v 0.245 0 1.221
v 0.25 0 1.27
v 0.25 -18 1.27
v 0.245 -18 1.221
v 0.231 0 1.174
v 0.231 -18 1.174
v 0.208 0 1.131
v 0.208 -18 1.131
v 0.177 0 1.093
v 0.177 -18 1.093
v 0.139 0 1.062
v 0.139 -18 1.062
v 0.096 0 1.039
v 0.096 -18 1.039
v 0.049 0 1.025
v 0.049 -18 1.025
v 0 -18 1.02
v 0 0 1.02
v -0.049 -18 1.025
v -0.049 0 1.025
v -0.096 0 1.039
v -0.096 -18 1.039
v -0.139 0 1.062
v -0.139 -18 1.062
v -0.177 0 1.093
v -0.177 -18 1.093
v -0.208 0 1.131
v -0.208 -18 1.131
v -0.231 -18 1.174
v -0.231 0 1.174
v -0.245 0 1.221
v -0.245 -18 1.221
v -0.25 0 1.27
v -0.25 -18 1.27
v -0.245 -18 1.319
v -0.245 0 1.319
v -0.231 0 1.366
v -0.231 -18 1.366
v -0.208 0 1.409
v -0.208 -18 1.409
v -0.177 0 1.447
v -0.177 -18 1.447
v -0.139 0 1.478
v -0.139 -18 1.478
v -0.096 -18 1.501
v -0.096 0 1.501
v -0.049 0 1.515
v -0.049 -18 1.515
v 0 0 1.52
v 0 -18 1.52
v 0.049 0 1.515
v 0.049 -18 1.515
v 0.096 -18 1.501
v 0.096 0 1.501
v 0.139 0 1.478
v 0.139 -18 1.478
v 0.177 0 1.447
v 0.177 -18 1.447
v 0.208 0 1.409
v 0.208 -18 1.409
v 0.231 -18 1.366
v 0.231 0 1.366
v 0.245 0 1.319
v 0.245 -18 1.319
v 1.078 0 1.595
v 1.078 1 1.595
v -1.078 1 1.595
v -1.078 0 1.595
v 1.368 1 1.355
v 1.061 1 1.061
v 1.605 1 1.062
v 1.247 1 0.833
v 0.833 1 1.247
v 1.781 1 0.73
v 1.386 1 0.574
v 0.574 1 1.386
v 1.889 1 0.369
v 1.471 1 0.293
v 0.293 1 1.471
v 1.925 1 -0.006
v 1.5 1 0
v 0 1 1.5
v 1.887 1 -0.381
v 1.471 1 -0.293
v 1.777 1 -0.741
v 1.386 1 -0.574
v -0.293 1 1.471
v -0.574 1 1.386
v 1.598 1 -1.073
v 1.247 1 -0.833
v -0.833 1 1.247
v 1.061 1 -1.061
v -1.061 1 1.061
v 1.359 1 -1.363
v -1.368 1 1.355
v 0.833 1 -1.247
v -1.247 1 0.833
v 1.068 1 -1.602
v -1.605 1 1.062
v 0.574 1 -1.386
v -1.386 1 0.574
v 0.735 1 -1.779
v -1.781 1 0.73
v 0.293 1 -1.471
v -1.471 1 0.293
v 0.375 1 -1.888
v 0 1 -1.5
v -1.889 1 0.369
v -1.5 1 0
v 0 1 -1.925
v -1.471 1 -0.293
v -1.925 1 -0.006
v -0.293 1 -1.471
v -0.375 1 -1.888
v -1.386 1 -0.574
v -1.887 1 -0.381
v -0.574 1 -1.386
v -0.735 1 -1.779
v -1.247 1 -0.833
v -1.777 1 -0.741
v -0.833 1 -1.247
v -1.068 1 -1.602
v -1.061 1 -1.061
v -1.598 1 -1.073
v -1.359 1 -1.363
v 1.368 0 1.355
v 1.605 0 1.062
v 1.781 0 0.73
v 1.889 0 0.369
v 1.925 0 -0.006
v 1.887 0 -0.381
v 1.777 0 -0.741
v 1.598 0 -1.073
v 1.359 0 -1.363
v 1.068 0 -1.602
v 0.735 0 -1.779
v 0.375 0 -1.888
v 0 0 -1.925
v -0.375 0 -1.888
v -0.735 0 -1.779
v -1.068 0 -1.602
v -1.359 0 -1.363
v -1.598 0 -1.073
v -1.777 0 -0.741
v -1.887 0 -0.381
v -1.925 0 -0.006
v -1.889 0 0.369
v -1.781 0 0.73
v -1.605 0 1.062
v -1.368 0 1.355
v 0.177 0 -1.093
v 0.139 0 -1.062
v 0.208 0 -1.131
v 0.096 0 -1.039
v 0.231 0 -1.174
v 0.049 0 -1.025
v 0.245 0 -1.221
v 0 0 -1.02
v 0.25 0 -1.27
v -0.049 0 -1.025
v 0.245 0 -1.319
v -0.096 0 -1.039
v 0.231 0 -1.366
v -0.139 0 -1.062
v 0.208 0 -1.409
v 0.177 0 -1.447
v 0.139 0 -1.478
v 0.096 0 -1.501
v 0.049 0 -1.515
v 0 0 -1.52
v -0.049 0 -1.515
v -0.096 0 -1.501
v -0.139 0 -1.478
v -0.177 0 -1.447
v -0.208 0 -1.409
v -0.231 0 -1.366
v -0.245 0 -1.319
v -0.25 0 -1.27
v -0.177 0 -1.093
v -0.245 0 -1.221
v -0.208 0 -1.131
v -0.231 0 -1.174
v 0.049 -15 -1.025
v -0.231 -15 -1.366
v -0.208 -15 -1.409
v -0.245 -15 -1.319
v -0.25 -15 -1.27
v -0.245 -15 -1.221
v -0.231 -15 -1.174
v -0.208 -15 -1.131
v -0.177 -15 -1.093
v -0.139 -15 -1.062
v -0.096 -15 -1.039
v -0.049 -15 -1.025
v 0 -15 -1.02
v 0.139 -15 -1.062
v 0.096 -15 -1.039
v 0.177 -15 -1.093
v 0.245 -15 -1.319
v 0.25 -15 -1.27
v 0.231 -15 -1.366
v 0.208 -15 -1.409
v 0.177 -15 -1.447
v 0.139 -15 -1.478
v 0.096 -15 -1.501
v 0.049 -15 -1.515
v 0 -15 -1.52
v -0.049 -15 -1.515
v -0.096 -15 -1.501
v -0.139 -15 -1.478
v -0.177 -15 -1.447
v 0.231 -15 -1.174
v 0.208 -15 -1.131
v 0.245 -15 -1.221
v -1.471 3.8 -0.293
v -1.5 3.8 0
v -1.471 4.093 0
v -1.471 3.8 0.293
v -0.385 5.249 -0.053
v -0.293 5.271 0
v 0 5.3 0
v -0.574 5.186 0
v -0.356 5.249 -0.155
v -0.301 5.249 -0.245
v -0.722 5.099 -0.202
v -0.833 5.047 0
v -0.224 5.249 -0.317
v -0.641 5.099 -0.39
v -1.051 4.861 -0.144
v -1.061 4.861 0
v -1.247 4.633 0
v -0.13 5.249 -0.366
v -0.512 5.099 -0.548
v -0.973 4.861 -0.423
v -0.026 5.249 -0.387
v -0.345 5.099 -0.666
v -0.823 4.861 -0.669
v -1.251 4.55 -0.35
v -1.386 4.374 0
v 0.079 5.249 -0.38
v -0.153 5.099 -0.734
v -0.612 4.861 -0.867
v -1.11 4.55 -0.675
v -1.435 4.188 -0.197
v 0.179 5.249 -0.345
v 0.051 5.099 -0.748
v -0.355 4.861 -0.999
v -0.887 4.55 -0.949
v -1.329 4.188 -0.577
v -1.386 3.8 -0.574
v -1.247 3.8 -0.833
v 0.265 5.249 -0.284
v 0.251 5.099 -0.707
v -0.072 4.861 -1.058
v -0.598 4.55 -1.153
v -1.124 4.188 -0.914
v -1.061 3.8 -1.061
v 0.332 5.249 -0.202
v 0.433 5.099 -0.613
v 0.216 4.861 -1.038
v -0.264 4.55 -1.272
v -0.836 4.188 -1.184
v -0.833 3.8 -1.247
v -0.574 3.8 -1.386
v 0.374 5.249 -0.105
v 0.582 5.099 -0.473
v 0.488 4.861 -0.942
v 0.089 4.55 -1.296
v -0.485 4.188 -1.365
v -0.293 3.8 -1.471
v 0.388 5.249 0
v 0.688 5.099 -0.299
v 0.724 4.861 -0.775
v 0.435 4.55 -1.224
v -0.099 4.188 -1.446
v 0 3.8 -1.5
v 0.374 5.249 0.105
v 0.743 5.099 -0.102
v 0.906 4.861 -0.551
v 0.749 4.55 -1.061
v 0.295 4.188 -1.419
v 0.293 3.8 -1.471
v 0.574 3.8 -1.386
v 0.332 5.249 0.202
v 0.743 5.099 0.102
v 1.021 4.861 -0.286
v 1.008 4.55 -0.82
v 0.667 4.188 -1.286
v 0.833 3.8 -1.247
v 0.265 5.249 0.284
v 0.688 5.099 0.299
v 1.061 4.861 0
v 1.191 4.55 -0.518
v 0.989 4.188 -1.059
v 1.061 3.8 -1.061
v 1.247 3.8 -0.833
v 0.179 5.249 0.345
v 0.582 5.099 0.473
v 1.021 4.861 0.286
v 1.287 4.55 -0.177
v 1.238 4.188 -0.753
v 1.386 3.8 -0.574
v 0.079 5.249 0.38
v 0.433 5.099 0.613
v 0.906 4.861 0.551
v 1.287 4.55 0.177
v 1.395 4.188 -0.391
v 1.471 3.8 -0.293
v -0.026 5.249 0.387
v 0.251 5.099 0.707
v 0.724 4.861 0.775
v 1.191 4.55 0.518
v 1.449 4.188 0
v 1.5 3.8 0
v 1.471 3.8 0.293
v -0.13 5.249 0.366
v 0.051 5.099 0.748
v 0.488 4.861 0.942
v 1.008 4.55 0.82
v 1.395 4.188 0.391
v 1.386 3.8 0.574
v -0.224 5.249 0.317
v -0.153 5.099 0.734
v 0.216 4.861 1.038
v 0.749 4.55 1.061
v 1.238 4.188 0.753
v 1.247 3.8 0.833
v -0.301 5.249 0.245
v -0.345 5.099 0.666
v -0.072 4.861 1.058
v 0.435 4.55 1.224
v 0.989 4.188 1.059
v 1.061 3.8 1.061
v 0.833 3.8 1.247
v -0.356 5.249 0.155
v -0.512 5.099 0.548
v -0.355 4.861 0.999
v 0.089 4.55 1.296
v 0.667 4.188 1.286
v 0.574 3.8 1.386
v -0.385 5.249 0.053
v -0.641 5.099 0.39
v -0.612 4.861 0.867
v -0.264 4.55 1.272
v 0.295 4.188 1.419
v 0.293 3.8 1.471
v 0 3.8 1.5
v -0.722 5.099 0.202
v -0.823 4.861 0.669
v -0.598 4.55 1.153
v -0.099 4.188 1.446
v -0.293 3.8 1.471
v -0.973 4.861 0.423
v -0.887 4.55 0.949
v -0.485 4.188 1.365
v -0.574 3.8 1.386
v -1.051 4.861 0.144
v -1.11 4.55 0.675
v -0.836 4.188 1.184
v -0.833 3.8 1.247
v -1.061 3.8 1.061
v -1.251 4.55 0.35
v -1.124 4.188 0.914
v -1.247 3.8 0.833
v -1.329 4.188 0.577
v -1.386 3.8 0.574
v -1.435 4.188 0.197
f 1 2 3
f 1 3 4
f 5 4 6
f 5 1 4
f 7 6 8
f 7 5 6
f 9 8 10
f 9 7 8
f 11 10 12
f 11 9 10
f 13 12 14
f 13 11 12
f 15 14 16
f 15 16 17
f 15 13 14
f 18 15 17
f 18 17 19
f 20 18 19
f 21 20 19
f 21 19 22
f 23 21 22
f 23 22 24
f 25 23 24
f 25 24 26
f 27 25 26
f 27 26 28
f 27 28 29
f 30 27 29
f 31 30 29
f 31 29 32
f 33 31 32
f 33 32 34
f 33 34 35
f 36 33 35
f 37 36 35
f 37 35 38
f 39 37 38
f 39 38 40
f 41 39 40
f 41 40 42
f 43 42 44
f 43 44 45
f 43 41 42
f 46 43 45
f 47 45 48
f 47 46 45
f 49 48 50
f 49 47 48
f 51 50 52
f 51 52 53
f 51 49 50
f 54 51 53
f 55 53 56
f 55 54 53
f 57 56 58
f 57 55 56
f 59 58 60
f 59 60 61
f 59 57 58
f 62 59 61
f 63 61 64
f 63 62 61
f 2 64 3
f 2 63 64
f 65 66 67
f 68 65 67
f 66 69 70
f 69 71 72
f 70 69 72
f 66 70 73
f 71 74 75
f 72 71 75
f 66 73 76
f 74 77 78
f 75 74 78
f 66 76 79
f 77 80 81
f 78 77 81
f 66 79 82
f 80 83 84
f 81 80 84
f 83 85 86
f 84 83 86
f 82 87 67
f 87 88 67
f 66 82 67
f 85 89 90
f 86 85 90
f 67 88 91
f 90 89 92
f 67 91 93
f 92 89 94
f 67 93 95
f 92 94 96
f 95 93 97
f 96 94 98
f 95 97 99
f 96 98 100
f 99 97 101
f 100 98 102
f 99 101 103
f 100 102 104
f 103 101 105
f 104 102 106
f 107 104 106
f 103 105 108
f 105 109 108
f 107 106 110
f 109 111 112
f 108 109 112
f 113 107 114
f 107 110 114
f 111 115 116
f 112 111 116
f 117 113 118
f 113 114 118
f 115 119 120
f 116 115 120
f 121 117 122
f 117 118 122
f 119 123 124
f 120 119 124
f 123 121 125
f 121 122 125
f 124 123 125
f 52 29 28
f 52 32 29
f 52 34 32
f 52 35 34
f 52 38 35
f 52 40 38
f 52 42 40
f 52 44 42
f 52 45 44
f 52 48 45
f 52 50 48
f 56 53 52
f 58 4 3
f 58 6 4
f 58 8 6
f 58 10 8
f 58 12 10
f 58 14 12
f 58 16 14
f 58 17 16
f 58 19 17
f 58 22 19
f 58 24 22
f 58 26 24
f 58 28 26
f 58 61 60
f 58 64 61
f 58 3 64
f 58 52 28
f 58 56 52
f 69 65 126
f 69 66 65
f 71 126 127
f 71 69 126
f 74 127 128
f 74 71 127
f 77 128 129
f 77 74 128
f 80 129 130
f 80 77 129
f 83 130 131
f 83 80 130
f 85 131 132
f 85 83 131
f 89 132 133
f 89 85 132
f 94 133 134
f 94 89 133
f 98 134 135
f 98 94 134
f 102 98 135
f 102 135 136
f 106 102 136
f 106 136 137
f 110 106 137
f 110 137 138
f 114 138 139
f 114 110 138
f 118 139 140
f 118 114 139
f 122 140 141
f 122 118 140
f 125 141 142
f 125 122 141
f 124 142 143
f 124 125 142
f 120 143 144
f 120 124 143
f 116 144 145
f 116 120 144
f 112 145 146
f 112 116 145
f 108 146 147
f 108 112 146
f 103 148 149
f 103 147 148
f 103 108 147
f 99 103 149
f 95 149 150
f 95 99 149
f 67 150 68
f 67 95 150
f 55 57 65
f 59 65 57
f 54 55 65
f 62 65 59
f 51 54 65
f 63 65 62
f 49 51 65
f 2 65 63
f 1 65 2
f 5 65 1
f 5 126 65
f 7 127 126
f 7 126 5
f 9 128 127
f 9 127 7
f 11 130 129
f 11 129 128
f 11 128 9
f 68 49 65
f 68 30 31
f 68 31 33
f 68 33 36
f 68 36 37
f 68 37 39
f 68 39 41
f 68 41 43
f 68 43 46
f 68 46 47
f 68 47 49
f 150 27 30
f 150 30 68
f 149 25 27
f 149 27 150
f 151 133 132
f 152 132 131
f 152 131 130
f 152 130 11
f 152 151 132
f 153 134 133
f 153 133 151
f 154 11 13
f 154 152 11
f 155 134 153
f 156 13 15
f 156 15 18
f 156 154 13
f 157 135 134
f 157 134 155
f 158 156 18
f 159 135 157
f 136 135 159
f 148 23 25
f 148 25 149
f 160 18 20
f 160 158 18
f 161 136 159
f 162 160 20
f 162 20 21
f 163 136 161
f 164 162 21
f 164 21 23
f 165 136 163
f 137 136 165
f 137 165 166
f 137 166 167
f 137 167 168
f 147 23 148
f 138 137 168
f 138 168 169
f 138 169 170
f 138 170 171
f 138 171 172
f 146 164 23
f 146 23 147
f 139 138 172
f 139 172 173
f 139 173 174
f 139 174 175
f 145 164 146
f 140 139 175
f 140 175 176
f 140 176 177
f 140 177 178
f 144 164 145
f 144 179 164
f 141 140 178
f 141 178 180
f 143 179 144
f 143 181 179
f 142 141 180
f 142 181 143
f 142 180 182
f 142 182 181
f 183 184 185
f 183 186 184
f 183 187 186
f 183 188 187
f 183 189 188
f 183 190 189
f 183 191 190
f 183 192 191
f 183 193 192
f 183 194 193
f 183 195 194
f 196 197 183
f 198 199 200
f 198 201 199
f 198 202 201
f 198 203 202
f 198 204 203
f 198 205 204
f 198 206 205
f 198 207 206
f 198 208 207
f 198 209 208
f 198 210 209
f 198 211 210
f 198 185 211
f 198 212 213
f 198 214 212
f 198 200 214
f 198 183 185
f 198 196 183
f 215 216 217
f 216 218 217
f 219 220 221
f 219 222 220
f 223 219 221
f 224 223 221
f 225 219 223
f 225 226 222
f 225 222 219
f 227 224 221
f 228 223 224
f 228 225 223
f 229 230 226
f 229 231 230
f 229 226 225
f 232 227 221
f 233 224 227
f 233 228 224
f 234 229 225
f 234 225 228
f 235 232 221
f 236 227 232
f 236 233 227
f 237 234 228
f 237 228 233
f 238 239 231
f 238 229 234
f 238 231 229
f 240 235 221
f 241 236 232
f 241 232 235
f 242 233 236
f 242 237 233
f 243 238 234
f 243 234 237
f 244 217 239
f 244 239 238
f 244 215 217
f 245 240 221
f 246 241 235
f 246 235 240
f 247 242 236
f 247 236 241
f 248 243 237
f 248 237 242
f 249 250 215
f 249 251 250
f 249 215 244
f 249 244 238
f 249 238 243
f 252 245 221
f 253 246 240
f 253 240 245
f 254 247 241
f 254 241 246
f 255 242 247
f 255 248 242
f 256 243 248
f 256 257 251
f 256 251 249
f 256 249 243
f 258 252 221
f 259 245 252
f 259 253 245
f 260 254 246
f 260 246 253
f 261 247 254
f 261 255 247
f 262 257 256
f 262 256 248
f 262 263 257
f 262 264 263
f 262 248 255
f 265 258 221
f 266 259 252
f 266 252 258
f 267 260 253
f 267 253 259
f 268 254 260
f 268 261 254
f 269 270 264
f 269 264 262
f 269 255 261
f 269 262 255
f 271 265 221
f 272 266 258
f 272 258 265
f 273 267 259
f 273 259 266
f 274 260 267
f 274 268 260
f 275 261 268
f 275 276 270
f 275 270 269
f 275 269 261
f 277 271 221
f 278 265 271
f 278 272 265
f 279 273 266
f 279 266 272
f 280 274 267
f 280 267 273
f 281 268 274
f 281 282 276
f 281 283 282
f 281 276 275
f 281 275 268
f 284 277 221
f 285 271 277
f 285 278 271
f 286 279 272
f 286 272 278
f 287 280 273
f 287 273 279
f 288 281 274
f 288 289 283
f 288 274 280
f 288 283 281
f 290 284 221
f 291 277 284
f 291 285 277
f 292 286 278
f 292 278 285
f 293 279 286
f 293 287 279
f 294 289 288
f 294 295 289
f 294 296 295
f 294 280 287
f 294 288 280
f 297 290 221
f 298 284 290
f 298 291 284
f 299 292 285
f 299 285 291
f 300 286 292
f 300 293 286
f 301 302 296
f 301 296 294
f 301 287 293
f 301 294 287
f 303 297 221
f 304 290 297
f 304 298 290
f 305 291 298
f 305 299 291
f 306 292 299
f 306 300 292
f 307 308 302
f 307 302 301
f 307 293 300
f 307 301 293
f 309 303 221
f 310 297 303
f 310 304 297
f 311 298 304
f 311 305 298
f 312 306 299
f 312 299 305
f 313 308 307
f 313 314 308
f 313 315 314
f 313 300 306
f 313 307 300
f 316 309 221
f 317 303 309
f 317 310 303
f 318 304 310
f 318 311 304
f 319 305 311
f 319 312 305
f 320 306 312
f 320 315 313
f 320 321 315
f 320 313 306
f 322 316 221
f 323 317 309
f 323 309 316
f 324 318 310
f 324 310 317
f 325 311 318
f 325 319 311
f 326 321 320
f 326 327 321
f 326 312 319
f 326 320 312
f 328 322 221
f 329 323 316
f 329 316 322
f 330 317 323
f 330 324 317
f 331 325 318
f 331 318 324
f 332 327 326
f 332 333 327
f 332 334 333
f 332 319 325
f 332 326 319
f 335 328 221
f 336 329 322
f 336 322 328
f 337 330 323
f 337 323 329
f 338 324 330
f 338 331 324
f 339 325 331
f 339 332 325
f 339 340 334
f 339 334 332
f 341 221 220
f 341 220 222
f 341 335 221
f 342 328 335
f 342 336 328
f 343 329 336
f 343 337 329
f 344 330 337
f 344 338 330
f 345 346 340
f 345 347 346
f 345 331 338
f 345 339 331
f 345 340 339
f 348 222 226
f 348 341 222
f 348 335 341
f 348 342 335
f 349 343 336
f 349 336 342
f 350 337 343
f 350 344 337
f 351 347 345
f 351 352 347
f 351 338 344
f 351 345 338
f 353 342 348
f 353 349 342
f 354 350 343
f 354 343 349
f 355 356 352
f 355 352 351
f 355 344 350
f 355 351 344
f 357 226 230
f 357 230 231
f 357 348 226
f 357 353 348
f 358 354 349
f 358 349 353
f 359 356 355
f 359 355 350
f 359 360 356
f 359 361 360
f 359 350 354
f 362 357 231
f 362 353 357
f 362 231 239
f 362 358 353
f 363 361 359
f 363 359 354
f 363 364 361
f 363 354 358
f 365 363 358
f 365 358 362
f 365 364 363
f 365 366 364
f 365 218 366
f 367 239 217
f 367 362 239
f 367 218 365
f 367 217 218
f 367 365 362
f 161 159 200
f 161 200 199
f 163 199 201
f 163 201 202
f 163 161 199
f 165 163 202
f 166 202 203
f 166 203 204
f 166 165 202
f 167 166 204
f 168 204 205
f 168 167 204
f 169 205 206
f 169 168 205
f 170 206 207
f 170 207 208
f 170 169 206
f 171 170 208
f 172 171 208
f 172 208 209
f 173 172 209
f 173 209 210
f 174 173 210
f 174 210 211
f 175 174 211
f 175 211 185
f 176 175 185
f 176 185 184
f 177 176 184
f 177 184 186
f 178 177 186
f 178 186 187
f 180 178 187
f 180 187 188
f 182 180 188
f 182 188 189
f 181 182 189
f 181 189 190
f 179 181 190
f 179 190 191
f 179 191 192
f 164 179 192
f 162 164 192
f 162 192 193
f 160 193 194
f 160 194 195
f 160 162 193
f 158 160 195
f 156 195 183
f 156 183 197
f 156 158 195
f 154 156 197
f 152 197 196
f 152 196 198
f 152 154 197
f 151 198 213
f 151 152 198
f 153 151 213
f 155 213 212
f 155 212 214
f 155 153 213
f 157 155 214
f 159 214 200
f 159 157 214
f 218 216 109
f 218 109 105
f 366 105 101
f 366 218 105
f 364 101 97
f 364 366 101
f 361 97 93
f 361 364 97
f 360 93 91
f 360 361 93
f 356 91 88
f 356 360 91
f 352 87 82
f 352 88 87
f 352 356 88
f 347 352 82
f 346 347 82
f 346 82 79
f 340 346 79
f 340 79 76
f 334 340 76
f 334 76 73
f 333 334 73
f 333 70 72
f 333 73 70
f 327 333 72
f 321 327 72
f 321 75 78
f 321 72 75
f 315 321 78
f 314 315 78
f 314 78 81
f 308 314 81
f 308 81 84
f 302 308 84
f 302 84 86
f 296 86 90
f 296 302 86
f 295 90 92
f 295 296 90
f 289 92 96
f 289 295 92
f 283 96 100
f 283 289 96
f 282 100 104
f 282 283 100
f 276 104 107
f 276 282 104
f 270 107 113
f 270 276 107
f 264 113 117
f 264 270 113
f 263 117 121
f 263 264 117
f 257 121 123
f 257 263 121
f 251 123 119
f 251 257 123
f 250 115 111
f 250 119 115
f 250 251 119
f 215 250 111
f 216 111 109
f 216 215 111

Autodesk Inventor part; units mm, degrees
ref_plane "YZ Plane" through (0, 0, 0) normal (1, 0, 0) x (0, 1, 0)
ref_plane "XZ Plane" through (0, 0, 0) normal (0, 1, 0) x (-1, 0, 0)
ref_plane "XY Plane" through (0, 0, 0) normal (0, 0, 1) x (1, 0, 0)
sketch "Sketch1" plane through (0, 0, 0) normal (0, 0, 1) x (1, 0, 0)
  line L0 (0, 0) -> (1.925, 0)
  line L1 (1.925, 0) -> (1.925, 1)
  line L2 (1.925, 1) -> (1.5, 1)
  line L3 (1.5, 1) -> (1.5, 3.8)
  line L4 (0, 5.3) -> (0, 5.3)
  line L5 (0, 0) -> (-1.925, 0)
  line L6 (-1.925, 0) -> (-1.925, 1)
  line L7 (-1.925, 1) -> (-1.5, 1)
  line L8 (-1.5, 1) -> (-1.5, 3.8)
  line L9 (0, 5.3) -> (0, 5.3)
  arc A0 (0, 5.3) -> (-1.5, 3.8) centre (0, 3.8) ccw
  arc A1 (1.5, 3.8) -> (0, 5.3) centre (0, 3.8) ccw
  line L10 (0, 5.3) -> (0, 0)
  point P0 (1.5, 5.3)
  dimension "d0" = 1.925
  dimension "d1" = 1
  dimension "d2" = 0.425
  dimension "d3" = 4.3
  dimension "d4" = 1.5
  dimension "d5" = 1.925
  dimension "d6" = 0.425
  dimension "d7" = 1.5
revolve "Revolution1" add sketch "Sketch1" angle 360 about axis through (0, 5.3, 0) along (0, -1, 0) contours L5 L6 L7 L8 A0 L10
sketch "Sketch2" plane through (0, 0, 0) normal (0, -1, 0) x (1, 0, 0)
  circle A0 centre (0, 1.27) radius 0.25
  circle A1 centre (0, -1.27) radius 0.25
  line L0 (0, -1.02) -> (0, 1.02)
  point P0 (0, 0)
  point P1 (0, 0)
  dimension "d10" = 0.5
  dimension "d9" = 2.04
extrude "Extrusion1" add sketch "Sketch2" along normal blind 18 contours A0
extrude "Extrusion2" add sketch "Sketch2" along normal blind 15 contours A1
sketch "Sketch3" plane through (0, 1, 0) normal (0, 1, 0) x (1, 0, 0)
  circle A0 centre (0, 0) radius 1.5 projected
  circle A1 centre (0, -1.27) radius 0.25 projected
  circle A2 centre (0, 0) radius 1.925 projected
  circle A3 centre (0, 0) radius 1.5 projected
  circle A4 centre (0, 0) radius 1.925 projected
  arc A5 (-1.0778, -1.595) -> (1.0778, -1.595) centre (0, 0) ccw
  line L0 (1.0778, -1.595) -> (-1.0778, -1.595)
  line L1 (0, -1.52) -> (0, -1.595)
  point P0 (0, 0)
  dimension "d17" = 0.075
extrude "Extrusion3" cut sketch "Sketch3" against normal up to surface (1 mm away) contours L0 A2 picked at (0.5832, -1.6646)
properties part number "LED" material "Polycarbonate, Clear"
